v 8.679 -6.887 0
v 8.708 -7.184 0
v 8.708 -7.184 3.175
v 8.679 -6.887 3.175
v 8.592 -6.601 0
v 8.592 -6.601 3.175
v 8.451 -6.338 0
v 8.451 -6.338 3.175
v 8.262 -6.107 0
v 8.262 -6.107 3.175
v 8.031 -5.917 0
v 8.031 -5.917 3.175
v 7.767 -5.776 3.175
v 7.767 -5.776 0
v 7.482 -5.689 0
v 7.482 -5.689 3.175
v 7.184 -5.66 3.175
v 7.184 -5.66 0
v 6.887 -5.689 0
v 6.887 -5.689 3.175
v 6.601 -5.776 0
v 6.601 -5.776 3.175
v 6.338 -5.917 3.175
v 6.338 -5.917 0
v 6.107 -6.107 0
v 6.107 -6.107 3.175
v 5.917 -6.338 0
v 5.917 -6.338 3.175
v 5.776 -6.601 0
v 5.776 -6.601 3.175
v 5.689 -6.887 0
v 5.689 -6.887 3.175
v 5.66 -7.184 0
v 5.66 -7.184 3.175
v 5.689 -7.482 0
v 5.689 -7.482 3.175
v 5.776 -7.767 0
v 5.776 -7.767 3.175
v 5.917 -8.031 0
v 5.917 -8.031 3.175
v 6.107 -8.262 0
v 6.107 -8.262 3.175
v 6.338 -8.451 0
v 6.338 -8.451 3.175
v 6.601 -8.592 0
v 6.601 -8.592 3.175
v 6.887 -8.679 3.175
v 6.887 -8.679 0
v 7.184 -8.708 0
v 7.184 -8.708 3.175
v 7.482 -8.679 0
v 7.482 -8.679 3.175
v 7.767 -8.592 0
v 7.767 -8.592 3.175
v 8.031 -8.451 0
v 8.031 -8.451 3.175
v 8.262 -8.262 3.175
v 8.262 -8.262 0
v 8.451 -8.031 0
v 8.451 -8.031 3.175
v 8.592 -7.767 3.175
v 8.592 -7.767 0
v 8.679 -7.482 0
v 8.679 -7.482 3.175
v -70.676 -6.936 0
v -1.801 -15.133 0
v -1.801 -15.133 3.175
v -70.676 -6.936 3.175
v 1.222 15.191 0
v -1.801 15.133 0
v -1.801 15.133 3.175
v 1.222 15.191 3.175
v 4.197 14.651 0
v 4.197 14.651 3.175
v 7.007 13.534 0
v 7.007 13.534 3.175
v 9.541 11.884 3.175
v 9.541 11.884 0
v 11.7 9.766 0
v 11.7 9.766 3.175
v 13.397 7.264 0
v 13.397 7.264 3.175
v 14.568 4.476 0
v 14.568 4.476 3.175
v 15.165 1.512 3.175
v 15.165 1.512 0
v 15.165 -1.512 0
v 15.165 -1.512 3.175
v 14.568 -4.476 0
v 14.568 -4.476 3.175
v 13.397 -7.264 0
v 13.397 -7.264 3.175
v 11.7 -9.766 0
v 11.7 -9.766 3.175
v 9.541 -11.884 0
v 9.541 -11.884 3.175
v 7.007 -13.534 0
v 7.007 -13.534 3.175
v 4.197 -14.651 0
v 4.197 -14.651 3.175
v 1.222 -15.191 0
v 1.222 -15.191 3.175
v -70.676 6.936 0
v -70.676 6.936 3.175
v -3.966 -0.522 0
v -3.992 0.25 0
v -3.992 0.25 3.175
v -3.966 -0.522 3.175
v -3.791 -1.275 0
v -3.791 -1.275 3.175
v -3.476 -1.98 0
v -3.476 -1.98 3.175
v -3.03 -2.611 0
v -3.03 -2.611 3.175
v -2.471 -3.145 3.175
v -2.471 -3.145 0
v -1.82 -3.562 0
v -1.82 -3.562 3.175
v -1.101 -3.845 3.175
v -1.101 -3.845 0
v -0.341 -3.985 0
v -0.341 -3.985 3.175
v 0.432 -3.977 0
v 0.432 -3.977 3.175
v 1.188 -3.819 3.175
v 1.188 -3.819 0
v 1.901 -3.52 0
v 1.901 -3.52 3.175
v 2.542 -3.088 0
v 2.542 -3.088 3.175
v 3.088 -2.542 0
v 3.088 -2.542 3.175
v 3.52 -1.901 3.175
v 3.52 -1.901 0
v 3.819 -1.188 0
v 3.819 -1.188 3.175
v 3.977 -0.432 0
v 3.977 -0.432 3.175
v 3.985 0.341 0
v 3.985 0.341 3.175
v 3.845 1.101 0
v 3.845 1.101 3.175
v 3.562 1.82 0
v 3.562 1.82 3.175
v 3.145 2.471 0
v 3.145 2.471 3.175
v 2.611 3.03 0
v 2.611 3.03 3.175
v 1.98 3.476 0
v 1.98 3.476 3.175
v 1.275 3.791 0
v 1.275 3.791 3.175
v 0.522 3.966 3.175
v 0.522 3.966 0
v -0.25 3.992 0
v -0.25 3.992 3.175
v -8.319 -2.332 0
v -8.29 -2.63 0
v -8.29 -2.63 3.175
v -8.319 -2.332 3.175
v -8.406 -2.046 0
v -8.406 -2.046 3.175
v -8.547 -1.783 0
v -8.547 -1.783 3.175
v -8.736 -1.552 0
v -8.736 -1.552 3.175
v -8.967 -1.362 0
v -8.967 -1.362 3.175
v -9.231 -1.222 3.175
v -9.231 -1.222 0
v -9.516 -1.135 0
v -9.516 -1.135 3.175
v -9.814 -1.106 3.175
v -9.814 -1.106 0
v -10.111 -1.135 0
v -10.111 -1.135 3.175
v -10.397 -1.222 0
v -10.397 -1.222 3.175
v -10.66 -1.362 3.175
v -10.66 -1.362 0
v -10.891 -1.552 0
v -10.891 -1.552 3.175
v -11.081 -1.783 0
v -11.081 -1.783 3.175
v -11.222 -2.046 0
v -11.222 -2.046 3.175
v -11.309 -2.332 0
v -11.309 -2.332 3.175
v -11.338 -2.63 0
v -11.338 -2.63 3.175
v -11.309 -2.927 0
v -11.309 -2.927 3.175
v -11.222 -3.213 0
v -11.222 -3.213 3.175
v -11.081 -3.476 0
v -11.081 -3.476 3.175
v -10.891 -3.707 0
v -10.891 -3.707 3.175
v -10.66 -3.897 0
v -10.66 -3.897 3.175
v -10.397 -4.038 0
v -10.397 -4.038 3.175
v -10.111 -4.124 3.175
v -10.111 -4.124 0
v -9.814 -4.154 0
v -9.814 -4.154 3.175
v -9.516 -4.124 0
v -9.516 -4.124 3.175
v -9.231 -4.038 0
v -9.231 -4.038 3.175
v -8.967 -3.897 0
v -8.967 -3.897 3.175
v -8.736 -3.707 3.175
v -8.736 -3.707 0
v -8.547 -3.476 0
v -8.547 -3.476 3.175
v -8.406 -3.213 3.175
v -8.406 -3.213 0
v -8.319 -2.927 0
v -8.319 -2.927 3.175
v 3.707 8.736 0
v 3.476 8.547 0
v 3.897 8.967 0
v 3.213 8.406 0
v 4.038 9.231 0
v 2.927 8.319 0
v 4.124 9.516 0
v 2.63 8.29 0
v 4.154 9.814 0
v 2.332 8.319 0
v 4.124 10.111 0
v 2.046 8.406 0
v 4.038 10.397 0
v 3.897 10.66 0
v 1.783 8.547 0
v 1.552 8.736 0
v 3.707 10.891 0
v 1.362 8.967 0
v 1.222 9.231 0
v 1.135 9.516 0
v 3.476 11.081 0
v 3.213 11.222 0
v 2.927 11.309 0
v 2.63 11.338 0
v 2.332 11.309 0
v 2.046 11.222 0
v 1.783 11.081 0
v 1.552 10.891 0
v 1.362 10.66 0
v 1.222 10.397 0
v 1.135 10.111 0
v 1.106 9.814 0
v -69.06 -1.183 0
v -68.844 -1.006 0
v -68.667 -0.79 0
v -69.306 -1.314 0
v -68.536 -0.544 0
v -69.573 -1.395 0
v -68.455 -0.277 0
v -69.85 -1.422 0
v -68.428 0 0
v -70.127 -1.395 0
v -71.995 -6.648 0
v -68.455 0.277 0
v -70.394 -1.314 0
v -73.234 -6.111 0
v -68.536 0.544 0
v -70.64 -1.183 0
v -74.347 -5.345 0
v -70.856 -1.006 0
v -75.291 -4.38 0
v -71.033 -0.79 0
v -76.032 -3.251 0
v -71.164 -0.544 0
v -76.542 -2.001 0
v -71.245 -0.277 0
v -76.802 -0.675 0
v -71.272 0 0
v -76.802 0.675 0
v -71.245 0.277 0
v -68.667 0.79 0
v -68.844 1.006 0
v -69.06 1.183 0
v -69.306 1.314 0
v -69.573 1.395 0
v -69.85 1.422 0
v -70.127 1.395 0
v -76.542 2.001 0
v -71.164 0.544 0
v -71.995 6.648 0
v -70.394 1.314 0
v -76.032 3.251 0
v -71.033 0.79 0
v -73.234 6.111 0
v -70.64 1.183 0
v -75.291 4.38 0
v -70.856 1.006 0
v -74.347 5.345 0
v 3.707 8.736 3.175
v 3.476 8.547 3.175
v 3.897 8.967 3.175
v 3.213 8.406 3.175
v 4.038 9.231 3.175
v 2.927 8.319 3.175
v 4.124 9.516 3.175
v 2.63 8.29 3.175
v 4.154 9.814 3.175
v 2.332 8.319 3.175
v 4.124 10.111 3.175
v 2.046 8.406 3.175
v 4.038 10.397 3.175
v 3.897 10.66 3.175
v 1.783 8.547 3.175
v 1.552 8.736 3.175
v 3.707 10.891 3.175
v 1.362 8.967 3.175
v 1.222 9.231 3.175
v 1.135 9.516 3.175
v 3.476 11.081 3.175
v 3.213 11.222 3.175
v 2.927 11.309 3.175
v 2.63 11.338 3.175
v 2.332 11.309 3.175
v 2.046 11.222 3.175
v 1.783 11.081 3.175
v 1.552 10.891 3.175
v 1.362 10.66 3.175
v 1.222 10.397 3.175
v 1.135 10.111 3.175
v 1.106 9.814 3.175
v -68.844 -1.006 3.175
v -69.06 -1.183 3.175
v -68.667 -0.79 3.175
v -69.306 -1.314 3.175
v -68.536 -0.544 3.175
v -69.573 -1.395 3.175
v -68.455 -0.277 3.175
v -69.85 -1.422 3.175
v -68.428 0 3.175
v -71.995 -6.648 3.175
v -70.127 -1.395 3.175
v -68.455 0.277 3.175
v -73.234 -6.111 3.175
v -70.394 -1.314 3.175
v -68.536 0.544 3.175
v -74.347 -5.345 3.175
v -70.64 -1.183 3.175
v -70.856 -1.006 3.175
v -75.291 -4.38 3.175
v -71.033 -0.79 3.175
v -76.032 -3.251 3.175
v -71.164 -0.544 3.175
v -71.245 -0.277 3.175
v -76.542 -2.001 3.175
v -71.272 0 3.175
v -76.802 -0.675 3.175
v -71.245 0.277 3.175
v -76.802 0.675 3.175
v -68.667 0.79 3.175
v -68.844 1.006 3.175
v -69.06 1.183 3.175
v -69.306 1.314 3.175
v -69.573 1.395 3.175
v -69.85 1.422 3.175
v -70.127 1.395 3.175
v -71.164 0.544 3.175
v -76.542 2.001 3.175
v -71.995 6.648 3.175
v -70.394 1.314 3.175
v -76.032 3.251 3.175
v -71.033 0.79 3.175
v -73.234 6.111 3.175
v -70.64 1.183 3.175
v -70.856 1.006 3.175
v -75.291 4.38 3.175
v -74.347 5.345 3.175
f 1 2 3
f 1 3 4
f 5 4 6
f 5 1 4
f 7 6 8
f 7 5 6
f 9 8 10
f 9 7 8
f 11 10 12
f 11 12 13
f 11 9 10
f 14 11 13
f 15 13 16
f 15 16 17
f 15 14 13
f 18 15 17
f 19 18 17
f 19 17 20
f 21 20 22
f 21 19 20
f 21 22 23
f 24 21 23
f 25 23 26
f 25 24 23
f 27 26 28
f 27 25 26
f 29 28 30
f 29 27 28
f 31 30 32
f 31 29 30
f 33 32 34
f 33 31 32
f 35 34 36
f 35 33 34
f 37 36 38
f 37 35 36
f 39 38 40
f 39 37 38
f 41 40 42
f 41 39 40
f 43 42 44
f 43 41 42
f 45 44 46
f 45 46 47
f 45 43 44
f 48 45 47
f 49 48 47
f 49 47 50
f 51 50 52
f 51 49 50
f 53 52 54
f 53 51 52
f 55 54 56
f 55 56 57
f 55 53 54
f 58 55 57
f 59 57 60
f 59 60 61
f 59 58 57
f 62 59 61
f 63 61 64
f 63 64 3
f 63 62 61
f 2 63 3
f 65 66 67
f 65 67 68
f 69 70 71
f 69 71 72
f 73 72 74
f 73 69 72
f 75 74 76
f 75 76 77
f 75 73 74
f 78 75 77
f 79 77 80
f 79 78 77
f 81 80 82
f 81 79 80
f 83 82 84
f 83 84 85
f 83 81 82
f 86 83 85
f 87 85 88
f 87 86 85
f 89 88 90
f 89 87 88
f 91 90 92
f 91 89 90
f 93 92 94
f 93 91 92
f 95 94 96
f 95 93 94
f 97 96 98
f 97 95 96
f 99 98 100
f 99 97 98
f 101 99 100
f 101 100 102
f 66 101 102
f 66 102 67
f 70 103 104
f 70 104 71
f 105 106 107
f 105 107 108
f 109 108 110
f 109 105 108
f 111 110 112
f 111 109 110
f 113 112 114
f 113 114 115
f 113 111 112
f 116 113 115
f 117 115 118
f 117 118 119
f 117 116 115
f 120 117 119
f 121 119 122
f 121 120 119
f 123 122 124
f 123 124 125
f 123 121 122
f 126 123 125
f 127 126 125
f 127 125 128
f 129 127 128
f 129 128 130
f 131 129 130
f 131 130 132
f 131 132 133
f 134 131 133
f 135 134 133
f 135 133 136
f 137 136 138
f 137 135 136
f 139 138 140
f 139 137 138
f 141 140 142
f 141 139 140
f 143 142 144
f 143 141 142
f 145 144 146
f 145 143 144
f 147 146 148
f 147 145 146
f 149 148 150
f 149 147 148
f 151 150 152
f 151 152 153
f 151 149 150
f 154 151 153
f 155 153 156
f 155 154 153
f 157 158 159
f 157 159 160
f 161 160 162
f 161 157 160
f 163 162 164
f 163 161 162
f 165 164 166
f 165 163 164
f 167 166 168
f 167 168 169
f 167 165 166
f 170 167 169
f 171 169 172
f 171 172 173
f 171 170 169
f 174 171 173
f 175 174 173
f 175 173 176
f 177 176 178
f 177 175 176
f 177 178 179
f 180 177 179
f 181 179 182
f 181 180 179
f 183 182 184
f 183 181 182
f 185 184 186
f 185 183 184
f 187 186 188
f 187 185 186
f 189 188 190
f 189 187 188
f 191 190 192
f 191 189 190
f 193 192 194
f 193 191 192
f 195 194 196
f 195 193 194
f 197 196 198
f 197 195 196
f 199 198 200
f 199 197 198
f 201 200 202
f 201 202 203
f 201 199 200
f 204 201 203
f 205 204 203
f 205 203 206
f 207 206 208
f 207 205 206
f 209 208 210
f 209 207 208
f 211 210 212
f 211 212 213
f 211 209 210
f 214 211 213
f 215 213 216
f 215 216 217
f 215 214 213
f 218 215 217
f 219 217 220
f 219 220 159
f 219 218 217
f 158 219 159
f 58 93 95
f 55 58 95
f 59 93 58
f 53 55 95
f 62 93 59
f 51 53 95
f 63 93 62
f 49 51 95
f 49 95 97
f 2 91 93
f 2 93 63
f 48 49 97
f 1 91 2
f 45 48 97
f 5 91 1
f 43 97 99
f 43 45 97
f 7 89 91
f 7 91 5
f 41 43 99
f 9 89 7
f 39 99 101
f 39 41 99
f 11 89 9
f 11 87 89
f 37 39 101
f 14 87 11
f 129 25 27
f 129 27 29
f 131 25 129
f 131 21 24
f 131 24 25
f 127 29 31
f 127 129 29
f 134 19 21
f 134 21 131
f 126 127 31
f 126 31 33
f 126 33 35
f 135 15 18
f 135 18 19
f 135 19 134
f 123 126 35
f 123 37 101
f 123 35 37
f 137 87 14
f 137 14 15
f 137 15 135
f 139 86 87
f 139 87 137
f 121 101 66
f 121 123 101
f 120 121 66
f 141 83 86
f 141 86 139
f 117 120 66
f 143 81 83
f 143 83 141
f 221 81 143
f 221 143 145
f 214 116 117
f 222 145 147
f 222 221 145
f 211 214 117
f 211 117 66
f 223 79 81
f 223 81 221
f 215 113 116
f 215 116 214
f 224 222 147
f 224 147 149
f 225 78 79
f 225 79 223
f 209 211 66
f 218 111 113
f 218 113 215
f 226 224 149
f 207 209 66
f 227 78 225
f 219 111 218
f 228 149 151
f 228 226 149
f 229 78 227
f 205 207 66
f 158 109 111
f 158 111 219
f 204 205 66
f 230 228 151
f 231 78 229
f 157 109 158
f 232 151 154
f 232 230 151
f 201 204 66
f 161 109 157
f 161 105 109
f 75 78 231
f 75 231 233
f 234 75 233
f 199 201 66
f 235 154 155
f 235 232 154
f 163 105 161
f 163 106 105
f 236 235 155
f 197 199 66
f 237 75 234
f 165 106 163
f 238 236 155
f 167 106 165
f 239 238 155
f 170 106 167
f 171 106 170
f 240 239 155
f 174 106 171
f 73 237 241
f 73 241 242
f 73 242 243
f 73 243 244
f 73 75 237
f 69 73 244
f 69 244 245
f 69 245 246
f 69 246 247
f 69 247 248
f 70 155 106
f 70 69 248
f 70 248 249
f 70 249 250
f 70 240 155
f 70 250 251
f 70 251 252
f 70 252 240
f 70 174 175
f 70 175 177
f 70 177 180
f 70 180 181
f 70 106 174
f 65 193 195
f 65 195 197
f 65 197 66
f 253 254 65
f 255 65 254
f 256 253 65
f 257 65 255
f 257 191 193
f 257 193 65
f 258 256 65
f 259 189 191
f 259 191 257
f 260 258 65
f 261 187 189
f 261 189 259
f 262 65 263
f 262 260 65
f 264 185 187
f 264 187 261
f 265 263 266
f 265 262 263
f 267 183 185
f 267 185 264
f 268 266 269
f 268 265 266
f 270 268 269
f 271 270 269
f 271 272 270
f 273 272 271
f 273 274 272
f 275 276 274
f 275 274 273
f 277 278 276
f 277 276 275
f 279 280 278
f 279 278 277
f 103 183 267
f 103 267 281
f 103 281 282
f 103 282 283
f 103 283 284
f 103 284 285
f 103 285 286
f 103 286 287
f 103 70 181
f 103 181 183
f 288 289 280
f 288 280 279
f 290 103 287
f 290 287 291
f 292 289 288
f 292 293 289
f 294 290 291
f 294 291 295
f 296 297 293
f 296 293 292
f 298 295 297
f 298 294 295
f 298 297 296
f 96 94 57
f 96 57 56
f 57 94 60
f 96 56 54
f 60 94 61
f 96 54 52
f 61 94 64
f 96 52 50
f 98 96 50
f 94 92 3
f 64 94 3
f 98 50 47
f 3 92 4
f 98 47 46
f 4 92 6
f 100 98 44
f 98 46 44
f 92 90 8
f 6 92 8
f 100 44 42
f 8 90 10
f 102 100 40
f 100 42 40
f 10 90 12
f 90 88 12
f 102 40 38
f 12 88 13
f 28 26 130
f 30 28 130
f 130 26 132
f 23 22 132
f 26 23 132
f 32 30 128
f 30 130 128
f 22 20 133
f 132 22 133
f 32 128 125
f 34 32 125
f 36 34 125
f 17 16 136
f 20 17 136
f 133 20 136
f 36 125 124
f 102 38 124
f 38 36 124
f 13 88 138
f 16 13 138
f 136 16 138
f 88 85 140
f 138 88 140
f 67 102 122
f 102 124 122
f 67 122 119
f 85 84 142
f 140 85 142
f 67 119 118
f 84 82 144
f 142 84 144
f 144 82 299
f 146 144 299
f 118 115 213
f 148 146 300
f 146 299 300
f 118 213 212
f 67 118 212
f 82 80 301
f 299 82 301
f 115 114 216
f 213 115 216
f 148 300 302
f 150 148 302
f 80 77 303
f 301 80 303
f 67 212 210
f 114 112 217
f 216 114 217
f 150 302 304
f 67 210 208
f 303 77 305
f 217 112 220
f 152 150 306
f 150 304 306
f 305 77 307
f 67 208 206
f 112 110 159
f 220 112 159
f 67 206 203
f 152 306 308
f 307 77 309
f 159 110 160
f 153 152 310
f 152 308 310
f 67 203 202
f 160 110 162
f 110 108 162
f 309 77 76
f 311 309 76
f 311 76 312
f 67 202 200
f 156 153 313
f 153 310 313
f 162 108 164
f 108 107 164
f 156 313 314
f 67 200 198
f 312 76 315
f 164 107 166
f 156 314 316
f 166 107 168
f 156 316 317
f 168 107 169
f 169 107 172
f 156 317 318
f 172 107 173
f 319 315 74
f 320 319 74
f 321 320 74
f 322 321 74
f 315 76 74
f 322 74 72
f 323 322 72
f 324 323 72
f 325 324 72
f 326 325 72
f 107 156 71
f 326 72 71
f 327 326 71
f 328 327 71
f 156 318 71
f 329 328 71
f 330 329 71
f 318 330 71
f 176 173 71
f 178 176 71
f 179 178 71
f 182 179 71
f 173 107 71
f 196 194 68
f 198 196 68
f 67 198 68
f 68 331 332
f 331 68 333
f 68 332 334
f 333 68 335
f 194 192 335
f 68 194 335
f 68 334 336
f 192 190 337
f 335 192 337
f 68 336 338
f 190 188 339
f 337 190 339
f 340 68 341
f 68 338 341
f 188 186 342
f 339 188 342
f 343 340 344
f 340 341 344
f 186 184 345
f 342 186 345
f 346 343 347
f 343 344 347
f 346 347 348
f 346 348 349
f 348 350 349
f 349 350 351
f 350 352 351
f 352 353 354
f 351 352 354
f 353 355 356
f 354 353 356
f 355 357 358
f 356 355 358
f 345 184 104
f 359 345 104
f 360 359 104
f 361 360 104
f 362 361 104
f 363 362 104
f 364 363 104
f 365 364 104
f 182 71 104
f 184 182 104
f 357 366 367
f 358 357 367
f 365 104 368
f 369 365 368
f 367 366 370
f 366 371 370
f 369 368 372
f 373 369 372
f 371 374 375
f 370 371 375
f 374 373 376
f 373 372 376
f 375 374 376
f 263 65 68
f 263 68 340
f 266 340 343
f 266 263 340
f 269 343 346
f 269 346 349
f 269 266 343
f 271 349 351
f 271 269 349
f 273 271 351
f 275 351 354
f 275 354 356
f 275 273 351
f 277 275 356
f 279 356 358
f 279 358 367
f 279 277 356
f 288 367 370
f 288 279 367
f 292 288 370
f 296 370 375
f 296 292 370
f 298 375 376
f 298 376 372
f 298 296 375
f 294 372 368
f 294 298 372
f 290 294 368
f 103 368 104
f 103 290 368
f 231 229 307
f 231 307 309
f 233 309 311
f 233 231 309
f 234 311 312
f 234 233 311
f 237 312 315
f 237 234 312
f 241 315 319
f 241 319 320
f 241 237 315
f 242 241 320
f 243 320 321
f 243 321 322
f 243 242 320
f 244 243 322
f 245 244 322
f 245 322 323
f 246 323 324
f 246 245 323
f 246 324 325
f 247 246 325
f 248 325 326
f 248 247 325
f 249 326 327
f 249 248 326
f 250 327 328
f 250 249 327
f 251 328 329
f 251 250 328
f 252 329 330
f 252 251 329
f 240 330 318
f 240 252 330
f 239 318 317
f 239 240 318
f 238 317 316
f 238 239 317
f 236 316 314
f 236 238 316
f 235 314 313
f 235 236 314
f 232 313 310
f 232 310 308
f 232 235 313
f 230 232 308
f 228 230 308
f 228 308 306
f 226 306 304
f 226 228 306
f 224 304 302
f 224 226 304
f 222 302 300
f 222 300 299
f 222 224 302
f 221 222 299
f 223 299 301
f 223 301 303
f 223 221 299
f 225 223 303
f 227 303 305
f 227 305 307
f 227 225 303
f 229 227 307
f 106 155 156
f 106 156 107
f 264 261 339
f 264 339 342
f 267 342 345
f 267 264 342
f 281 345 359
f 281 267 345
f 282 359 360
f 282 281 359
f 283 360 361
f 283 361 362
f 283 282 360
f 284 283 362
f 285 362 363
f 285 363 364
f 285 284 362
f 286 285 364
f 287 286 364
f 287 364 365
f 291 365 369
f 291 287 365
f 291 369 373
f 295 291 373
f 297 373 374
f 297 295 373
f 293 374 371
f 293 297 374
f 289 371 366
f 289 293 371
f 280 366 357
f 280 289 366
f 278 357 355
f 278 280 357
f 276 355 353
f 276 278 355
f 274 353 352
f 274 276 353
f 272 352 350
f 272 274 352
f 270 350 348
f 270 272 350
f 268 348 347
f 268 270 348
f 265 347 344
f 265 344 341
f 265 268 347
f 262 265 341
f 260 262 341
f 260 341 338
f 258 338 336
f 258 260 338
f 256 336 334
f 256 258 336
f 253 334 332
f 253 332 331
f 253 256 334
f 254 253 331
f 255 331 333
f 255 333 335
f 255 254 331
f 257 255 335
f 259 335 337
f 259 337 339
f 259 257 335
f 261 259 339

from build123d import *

# Parameters (mm, degrees)
SKETCH1_R           = 1.4224
SKETCH1_R_2         = 1.524
BOSS_EXTRUDE1_DEPTH = 3.175


with BuildPart() as part:
    # Sketch1 → Boss-Extrude1 (new body)
    with BuildSketch(Plane.XY):
        with BuildLine():
            Line((-70.6755, 6.936048929), (-1.801090909, 15.133197664))
            ThreePointArc((-1.801090909, 15.133197664), (15.24, 0), (-1.801090909, -15.133197664))
            Line((-1.801090909, -15.133197664), (-70.6755, -6.936048929))
            ThreePointArc((-70.6755, -6.936048929), (-76.835, 0), (-70.6755, 6.936048929))
        make_face()
        with Locations((-69.85, 0)):
            Circle(SKETCH1_R, mode=Mode.SUBTRACT)
        with Locations((7.184204897, -7.184204897)):
            Circle(SKETCH1_R_2, mode=Mode.SUBTRACT)
        with Locations((-9.813806395, -2.629601498)):
            Circle(SKETCH1_R_2, mode=Mode.SUBTRACT)
        with Locations((2.629601498, 9.813806395)):
            Circle(SKETCH1_R_2, mode=Mode.SUBTRACT)
        with BuildLine():
            Line((-0.25049165, 3.992149037), (-3.992149037, 0.25049165))
            ThreePointArc((-3.992149037, 0.25049165), (2.828427125, -2.828427125), (-0.25049165, 3.992149037))
        make_face(mode=Mode.SUBTRACT)
    extrude(amount=BOSS_EXTRUDE1_DEPTH)


solid = part.part
